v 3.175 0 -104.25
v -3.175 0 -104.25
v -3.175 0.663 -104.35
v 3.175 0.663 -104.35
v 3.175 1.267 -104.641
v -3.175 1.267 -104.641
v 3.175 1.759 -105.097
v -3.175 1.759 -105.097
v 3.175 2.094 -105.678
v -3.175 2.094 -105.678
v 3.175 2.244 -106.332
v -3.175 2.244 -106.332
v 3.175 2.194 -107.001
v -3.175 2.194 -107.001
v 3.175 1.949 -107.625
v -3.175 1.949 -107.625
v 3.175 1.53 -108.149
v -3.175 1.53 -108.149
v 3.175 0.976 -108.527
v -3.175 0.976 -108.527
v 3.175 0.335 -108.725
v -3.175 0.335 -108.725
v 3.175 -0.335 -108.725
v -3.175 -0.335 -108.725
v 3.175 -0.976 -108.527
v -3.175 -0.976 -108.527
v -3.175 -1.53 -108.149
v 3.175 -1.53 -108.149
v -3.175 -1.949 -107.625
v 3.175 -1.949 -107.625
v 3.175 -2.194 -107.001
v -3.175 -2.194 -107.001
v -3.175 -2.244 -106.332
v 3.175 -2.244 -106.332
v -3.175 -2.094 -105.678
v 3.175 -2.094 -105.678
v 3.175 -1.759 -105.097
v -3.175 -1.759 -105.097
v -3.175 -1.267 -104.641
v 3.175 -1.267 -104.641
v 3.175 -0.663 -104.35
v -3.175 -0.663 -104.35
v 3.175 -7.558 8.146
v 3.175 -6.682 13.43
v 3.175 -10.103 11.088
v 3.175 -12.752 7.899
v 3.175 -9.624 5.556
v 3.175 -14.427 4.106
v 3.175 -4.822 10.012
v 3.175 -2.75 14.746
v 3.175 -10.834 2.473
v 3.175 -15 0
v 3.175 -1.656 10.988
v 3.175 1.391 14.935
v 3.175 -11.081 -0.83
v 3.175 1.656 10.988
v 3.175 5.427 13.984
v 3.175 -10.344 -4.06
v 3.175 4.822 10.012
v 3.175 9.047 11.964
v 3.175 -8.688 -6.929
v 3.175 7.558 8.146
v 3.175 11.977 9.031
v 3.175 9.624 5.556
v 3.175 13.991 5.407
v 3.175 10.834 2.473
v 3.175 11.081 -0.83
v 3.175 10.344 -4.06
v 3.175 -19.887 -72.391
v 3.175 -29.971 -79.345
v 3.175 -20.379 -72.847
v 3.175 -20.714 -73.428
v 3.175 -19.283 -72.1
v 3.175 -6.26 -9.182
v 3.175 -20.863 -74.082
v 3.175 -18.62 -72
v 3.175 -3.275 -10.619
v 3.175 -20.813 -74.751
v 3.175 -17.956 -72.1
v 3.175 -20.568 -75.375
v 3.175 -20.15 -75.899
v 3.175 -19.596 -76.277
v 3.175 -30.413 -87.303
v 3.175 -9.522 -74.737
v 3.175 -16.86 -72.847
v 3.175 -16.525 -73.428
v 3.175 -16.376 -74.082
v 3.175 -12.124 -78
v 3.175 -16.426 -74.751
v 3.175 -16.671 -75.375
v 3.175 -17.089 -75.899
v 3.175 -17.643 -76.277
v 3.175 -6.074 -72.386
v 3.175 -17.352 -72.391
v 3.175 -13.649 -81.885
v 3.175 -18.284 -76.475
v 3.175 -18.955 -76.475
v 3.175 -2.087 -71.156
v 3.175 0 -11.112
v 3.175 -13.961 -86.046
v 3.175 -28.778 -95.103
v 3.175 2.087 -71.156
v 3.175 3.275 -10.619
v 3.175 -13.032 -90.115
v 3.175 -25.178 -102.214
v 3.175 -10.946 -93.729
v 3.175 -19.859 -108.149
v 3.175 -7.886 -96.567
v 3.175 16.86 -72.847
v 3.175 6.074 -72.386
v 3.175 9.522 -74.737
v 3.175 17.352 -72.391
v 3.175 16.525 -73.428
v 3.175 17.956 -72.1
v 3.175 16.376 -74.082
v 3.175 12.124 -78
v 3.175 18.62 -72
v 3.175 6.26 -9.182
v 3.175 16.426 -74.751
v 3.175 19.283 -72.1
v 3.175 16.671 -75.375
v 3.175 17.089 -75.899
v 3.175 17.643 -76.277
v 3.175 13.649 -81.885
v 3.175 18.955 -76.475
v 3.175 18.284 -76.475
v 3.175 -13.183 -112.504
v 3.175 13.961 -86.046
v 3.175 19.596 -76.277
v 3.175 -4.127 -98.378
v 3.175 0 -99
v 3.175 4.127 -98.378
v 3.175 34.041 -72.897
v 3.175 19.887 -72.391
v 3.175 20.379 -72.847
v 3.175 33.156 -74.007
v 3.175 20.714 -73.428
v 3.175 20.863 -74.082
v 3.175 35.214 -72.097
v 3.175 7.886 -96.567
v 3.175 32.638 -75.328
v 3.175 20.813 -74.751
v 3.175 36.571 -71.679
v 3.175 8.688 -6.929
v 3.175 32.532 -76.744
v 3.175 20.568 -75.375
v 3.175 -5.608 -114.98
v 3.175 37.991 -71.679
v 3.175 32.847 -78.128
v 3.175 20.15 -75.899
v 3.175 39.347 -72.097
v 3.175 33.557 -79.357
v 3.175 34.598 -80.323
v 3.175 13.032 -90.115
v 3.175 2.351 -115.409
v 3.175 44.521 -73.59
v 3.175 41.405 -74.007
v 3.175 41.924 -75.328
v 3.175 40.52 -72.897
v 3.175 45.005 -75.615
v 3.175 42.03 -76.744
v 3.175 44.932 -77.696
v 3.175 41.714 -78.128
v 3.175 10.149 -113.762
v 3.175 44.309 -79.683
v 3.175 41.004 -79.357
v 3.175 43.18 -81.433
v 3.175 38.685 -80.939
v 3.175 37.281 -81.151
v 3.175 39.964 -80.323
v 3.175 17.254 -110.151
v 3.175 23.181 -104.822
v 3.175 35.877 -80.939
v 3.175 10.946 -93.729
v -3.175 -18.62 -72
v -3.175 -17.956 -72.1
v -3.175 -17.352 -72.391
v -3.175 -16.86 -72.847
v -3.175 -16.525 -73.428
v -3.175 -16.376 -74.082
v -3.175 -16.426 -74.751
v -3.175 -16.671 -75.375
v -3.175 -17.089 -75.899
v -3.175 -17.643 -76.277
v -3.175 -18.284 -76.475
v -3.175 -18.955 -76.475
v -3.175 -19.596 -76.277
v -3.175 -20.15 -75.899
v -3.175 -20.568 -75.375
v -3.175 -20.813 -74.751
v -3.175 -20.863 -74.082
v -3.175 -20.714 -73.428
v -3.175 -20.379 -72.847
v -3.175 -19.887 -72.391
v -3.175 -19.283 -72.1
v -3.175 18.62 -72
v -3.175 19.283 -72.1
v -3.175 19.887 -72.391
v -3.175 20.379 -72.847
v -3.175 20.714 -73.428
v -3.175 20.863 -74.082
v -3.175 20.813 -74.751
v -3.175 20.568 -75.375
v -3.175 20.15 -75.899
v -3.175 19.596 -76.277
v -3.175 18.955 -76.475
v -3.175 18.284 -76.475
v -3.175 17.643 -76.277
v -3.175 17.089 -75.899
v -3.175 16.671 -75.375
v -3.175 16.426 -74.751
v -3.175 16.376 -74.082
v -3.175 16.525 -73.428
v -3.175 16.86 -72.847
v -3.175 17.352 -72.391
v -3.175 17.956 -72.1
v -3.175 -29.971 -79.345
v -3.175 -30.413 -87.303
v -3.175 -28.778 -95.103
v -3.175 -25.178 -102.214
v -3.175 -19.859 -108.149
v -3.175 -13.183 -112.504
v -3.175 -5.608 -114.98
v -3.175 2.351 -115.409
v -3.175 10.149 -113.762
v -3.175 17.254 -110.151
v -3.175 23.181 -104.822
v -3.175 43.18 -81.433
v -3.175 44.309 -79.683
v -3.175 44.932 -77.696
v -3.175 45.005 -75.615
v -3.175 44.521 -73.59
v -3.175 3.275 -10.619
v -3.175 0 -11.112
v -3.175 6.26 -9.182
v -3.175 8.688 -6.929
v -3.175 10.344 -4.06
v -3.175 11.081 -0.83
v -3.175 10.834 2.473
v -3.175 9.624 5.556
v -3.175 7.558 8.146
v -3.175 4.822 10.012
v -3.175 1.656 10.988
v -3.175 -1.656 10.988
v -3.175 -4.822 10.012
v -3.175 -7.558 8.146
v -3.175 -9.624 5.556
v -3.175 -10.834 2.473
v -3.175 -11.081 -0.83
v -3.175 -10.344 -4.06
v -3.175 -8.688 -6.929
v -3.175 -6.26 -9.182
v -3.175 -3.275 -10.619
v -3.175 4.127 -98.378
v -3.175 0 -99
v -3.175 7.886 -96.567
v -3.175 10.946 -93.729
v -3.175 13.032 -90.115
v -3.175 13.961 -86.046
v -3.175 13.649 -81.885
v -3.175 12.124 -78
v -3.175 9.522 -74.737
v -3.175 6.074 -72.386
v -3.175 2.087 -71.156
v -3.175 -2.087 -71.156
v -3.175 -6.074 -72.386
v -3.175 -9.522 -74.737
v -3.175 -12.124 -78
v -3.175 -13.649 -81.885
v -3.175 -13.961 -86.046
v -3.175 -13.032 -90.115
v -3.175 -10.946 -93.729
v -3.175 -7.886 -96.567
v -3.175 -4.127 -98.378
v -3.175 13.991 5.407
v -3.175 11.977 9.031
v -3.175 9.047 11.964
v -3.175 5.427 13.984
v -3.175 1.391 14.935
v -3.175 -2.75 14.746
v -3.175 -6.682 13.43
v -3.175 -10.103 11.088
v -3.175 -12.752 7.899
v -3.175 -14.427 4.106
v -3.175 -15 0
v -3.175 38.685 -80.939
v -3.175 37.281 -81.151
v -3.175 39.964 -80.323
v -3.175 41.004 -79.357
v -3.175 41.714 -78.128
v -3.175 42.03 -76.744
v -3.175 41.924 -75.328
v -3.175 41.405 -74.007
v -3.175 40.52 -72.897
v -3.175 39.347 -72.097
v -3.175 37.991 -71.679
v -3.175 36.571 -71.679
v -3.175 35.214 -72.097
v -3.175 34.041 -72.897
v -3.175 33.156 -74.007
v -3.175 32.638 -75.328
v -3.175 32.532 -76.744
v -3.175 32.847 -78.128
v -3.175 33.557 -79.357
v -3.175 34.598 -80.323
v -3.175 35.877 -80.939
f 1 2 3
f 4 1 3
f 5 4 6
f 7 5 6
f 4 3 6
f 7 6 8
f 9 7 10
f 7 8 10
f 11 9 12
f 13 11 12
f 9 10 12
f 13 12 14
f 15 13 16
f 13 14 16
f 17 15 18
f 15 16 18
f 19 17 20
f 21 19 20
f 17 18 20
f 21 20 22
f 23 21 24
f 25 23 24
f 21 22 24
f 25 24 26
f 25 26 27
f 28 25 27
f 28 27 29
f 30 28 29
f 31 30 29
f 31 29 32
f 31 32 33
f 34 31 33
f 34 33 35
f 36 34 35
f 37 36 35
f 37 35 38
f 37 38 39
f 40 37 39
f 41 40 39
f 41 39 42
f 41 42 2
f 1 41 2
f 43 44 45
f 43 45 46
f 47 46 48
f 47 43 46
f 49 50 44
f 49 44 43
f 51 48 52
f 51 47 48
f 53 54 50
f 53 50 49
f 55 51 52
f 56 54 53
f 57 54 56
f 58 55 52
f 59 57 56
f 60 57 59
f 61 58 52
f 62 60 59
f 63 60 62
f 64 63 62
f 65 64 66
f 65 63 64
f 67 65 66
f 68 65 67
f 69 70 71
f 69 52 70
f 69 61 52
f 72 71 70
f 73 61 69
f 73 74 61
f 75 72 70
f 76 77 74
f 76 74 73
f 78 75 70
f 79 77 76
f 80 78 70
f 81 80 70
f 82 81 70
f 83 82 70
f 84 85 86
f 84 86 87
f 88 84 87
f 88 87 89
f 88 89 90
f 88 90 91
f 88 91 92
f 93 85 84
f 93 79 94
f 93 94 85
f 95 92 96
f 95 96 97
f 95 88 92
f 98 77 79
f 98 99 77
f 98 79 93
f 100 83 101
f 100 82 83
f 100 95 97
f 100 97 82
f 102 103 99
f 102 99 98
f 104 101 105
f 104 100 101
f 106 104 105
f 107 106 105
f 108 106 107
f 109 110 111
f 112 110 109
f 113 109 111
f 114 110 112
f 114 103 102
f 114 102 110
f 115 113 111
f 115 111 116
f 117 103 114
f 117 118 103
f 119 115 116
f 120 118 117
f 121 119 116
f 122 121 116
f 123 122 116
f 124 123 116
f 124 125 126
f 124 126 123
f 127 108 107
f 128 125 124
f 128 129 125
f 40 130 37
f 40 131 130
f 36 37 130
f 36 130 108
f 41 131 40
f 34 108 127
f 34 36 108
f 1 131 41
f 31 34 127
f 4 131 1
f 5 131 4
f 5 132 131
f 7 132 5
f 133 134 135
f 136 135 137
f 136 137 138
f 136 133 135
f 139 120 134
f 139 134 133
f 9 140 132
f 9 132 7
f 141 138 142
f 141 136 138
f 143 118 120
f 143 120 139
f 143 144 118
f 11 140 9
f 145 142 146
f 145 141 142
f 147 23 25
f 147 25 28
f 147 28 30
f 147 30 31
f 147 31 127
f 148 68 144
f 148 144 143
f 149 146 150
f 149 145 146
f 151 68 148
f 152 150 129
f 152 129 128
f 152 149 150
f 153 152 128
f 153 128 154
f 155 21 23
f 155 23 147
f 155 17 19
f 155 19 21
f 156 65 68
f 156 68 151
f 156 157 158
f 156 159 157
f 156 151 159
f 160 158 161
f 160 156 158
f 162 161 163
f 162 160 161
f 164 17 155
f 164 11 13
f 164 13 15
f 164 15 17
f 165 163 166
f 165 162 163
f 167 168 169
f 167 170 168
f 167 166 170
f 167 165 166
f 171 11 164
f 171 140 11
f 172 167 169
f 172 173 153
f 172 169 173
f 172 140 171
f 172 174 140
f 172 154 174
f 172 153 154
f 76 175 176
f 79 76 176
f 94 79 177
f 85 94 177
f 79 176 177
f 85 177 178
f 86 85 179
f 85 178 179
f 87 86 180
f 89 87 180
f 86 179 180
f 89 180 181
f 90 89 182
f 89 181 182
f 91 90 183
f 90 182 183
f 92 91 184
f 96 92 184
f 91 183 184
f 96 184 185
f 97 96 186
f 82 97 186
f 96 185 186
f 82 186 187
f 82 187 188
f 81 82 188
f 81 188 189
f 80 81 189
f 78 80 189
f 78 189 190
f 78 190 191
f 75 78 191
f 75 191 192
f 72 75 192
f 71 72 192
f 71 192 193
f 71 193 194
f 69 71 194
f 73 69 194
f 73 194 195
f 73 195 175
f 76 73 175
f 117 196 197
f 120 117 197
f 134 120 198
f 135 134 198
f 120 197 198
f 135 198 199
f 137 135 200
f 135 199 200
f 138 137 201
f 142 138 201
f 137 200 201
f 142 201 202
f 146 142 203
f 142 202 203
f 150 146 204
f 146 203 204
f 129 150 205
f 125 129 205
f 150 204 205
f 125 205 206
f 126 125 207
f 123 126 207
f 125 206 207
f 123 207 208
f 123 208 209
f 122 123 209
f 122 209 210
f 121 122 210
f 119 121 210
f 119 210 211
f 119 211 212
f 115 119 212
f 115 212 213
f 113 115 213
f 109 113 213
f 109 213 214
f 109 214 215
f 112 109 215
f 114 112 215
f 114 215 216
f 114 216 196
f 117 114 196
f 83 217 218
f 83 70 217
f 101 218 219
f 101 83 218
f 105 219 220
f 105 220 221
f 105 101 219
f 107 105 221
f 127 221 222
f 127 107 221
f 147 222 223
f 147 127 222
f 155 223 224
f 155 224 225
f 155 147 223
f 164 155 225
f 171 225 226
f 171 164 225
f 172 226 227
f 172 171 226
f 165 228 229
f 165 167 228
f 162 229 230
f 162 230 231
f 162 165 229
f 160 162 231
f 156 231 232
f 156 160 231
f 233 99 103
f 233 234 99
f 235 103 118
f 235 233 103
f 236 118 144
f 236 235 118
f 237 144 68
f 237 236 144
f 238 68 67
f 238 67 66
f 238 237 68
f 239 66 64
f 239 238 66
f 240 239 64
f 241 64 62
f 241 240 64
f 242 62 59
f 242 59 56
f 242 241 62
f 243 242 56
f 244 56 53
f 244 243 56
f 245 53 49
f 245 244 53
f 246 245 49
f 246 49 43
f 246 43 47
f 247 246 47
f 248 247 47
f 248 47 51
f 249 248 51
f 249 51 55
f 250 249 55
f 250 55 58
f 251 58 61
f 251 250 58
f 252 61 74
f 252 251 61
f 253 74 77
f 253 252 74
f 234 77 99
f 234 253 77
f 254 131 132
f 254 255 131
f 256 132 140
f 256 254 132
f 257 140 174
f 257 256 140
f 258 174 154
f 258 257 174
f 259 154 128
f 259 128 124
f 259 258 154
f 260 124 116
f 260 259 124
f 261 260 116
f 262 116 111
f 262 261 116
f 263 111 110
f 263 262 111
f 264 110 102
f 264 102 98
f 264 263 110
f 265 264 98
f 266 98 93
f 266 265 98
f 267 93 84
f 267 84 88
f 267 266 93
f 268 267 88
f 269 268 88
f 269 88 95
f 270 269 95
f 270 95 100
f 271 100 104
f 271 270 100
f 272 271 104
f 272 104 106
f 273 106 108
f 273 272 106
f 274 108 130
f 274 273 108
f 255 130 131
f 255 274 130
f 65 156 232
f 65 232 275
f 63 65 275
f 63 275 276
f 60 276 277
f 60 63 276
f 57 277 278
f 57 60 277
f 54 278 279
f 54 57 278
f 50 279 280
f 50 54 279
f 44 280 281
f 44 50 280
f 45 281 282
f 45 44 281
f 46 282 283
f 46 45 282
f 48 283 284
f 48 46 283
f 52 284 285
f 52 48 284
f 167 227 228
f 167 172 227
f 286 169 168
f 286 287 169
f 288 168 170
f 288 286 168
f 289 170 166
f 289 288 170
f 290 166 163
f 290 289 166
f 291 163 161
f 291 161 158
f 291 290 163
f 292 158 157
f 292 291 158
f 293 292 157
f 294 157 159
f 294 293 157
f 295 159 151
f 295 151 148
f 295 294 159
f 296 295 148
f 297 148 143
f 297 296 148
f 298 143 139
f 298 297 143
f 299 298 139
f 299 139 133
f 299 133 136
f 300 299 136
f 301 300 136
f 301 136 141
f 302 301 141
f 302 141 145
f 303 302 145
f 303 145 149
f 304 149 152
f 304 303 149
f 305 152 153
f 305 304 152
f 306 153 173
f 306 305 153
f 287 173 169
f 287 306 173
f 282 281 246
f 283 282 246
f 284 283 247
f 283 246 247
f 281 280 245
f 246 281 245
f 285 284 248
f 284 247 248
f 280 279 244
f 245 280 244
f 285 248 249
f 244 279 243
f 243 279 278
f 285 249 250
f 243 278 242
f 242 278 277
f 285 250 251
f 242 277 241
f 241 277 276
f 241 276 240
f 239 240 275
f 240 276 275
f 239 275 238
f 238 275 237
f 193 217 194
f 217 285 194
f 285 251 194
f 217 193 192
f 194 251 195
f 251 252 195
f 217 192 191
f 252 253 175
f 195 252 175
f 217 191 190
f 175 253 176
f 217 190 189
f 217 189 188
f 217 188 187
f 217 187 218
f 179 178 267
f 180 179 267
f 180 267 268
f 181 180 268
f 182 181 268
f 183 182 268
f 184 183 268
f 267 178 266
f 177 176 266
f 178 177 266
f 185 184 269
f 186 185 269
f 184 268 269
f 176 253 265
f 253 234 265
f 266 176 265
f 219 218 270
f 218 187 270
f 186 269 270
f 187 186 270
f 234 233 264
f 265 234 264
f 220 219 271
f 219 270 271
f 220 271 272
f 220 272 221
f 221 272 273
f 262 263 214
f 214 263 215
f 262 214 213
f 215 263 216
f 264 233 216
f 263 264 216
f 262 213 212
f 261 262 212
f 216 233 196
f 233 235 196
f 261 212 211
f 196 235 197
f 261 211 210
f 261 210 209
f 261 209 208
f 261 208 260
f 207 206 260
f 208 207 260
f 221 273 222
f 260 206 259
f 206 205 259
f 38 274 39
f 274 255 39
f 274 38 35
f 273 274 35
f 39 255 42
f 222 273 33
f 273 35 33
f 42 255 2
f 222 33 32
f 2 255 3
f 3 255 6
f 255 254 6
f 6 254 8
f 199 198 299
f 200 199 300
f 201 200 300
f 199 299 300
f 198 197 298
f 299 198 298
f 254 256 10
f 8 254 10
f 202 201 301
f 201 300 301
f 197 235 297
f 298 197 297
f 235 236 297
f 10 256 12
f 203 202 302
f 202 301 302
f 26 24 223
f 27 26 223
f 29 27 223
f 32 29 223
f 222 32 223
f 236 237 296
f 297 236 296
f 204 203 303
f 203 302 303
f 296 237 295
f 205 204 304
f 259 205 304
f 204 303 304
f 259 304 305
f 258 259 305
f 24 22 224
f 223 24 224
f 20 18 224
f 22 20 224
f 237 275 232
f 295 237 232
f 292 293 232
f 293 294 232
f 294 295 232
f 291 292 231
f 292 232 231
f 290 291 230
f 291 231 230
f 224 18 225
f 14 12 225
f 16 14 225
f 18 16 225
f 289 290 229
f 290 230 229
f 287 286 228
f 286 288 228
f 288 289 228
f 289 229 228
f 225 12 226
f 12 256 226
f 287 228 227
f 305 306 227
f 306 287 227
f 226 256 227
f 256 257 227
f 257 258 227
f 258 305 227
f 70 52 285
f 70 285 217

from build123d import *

# Parameters (mm, degrees)
SKETCH1_R            = 11.1125
SKETCH1_R_2          = 14
SKETCH1_R_3          = 4.7625
BOSS_EXTRUDE1_DEPTH  = 3.175
M4_CLEARANCE_HOLE1_D = 4.5


with BuildPart() as part:
    # Sketch1 → Boss-Extrude1 (new, symmetric)
    with BuildSketch(Plane(origin=(0, 0, 0), x_dir=(0, 0, -1), z_dir=(1, 0, 0))):
        with BuildLine():
            ThreePointArc((81.432924752, 43.180446665), (77.696268156, 44.932233649), (73.589867092, 44.521343816))
            Line((73.589867092, 44.521343816), (-5.407259882, 13.991481))
            ThreePointArc((-5.407259882, 13.991481), (-14.745714886, -2.750253171), (0, -15))
            Line((0, -15), (79.344909163, -29.971151924))
            ThreePointArc((79.344909163, -29.971151924), (112.50372992, -13.183127113), (104.821761092, 23.180763301))
            Line((104.821761092, 23.180763301), (81.432924752, 43.180446665))
        make_face()
        Circle(SKETCH1_R, mode=Mode.SUBTRACT)
        with Locations((85, 0)):
            Circle(SKETCH1_R_2, mode=Mode.SUBTRACT)
        with Locations((76.388124081, 37.280752399)):
            Circle(SKETCH1_R_3, mode=Mode.SUBTRACT)
    extrude(amount=BOSS_EXTRUDE1_DEPTH, both=True)

    # M4 Clearance Hole1 (through all)
    with Locations(Plane(origin=(3.175, 0, 0), x_dir=(0, 0, -1), z_dir=(1, 0, 0))):
        with Locations((74.25, 18.619546181), (106.5, 0), (74.25, -18.619546181)):
            Hole(M4_CLEARANCE_HOLE1_D / 2)


solid = part.part
